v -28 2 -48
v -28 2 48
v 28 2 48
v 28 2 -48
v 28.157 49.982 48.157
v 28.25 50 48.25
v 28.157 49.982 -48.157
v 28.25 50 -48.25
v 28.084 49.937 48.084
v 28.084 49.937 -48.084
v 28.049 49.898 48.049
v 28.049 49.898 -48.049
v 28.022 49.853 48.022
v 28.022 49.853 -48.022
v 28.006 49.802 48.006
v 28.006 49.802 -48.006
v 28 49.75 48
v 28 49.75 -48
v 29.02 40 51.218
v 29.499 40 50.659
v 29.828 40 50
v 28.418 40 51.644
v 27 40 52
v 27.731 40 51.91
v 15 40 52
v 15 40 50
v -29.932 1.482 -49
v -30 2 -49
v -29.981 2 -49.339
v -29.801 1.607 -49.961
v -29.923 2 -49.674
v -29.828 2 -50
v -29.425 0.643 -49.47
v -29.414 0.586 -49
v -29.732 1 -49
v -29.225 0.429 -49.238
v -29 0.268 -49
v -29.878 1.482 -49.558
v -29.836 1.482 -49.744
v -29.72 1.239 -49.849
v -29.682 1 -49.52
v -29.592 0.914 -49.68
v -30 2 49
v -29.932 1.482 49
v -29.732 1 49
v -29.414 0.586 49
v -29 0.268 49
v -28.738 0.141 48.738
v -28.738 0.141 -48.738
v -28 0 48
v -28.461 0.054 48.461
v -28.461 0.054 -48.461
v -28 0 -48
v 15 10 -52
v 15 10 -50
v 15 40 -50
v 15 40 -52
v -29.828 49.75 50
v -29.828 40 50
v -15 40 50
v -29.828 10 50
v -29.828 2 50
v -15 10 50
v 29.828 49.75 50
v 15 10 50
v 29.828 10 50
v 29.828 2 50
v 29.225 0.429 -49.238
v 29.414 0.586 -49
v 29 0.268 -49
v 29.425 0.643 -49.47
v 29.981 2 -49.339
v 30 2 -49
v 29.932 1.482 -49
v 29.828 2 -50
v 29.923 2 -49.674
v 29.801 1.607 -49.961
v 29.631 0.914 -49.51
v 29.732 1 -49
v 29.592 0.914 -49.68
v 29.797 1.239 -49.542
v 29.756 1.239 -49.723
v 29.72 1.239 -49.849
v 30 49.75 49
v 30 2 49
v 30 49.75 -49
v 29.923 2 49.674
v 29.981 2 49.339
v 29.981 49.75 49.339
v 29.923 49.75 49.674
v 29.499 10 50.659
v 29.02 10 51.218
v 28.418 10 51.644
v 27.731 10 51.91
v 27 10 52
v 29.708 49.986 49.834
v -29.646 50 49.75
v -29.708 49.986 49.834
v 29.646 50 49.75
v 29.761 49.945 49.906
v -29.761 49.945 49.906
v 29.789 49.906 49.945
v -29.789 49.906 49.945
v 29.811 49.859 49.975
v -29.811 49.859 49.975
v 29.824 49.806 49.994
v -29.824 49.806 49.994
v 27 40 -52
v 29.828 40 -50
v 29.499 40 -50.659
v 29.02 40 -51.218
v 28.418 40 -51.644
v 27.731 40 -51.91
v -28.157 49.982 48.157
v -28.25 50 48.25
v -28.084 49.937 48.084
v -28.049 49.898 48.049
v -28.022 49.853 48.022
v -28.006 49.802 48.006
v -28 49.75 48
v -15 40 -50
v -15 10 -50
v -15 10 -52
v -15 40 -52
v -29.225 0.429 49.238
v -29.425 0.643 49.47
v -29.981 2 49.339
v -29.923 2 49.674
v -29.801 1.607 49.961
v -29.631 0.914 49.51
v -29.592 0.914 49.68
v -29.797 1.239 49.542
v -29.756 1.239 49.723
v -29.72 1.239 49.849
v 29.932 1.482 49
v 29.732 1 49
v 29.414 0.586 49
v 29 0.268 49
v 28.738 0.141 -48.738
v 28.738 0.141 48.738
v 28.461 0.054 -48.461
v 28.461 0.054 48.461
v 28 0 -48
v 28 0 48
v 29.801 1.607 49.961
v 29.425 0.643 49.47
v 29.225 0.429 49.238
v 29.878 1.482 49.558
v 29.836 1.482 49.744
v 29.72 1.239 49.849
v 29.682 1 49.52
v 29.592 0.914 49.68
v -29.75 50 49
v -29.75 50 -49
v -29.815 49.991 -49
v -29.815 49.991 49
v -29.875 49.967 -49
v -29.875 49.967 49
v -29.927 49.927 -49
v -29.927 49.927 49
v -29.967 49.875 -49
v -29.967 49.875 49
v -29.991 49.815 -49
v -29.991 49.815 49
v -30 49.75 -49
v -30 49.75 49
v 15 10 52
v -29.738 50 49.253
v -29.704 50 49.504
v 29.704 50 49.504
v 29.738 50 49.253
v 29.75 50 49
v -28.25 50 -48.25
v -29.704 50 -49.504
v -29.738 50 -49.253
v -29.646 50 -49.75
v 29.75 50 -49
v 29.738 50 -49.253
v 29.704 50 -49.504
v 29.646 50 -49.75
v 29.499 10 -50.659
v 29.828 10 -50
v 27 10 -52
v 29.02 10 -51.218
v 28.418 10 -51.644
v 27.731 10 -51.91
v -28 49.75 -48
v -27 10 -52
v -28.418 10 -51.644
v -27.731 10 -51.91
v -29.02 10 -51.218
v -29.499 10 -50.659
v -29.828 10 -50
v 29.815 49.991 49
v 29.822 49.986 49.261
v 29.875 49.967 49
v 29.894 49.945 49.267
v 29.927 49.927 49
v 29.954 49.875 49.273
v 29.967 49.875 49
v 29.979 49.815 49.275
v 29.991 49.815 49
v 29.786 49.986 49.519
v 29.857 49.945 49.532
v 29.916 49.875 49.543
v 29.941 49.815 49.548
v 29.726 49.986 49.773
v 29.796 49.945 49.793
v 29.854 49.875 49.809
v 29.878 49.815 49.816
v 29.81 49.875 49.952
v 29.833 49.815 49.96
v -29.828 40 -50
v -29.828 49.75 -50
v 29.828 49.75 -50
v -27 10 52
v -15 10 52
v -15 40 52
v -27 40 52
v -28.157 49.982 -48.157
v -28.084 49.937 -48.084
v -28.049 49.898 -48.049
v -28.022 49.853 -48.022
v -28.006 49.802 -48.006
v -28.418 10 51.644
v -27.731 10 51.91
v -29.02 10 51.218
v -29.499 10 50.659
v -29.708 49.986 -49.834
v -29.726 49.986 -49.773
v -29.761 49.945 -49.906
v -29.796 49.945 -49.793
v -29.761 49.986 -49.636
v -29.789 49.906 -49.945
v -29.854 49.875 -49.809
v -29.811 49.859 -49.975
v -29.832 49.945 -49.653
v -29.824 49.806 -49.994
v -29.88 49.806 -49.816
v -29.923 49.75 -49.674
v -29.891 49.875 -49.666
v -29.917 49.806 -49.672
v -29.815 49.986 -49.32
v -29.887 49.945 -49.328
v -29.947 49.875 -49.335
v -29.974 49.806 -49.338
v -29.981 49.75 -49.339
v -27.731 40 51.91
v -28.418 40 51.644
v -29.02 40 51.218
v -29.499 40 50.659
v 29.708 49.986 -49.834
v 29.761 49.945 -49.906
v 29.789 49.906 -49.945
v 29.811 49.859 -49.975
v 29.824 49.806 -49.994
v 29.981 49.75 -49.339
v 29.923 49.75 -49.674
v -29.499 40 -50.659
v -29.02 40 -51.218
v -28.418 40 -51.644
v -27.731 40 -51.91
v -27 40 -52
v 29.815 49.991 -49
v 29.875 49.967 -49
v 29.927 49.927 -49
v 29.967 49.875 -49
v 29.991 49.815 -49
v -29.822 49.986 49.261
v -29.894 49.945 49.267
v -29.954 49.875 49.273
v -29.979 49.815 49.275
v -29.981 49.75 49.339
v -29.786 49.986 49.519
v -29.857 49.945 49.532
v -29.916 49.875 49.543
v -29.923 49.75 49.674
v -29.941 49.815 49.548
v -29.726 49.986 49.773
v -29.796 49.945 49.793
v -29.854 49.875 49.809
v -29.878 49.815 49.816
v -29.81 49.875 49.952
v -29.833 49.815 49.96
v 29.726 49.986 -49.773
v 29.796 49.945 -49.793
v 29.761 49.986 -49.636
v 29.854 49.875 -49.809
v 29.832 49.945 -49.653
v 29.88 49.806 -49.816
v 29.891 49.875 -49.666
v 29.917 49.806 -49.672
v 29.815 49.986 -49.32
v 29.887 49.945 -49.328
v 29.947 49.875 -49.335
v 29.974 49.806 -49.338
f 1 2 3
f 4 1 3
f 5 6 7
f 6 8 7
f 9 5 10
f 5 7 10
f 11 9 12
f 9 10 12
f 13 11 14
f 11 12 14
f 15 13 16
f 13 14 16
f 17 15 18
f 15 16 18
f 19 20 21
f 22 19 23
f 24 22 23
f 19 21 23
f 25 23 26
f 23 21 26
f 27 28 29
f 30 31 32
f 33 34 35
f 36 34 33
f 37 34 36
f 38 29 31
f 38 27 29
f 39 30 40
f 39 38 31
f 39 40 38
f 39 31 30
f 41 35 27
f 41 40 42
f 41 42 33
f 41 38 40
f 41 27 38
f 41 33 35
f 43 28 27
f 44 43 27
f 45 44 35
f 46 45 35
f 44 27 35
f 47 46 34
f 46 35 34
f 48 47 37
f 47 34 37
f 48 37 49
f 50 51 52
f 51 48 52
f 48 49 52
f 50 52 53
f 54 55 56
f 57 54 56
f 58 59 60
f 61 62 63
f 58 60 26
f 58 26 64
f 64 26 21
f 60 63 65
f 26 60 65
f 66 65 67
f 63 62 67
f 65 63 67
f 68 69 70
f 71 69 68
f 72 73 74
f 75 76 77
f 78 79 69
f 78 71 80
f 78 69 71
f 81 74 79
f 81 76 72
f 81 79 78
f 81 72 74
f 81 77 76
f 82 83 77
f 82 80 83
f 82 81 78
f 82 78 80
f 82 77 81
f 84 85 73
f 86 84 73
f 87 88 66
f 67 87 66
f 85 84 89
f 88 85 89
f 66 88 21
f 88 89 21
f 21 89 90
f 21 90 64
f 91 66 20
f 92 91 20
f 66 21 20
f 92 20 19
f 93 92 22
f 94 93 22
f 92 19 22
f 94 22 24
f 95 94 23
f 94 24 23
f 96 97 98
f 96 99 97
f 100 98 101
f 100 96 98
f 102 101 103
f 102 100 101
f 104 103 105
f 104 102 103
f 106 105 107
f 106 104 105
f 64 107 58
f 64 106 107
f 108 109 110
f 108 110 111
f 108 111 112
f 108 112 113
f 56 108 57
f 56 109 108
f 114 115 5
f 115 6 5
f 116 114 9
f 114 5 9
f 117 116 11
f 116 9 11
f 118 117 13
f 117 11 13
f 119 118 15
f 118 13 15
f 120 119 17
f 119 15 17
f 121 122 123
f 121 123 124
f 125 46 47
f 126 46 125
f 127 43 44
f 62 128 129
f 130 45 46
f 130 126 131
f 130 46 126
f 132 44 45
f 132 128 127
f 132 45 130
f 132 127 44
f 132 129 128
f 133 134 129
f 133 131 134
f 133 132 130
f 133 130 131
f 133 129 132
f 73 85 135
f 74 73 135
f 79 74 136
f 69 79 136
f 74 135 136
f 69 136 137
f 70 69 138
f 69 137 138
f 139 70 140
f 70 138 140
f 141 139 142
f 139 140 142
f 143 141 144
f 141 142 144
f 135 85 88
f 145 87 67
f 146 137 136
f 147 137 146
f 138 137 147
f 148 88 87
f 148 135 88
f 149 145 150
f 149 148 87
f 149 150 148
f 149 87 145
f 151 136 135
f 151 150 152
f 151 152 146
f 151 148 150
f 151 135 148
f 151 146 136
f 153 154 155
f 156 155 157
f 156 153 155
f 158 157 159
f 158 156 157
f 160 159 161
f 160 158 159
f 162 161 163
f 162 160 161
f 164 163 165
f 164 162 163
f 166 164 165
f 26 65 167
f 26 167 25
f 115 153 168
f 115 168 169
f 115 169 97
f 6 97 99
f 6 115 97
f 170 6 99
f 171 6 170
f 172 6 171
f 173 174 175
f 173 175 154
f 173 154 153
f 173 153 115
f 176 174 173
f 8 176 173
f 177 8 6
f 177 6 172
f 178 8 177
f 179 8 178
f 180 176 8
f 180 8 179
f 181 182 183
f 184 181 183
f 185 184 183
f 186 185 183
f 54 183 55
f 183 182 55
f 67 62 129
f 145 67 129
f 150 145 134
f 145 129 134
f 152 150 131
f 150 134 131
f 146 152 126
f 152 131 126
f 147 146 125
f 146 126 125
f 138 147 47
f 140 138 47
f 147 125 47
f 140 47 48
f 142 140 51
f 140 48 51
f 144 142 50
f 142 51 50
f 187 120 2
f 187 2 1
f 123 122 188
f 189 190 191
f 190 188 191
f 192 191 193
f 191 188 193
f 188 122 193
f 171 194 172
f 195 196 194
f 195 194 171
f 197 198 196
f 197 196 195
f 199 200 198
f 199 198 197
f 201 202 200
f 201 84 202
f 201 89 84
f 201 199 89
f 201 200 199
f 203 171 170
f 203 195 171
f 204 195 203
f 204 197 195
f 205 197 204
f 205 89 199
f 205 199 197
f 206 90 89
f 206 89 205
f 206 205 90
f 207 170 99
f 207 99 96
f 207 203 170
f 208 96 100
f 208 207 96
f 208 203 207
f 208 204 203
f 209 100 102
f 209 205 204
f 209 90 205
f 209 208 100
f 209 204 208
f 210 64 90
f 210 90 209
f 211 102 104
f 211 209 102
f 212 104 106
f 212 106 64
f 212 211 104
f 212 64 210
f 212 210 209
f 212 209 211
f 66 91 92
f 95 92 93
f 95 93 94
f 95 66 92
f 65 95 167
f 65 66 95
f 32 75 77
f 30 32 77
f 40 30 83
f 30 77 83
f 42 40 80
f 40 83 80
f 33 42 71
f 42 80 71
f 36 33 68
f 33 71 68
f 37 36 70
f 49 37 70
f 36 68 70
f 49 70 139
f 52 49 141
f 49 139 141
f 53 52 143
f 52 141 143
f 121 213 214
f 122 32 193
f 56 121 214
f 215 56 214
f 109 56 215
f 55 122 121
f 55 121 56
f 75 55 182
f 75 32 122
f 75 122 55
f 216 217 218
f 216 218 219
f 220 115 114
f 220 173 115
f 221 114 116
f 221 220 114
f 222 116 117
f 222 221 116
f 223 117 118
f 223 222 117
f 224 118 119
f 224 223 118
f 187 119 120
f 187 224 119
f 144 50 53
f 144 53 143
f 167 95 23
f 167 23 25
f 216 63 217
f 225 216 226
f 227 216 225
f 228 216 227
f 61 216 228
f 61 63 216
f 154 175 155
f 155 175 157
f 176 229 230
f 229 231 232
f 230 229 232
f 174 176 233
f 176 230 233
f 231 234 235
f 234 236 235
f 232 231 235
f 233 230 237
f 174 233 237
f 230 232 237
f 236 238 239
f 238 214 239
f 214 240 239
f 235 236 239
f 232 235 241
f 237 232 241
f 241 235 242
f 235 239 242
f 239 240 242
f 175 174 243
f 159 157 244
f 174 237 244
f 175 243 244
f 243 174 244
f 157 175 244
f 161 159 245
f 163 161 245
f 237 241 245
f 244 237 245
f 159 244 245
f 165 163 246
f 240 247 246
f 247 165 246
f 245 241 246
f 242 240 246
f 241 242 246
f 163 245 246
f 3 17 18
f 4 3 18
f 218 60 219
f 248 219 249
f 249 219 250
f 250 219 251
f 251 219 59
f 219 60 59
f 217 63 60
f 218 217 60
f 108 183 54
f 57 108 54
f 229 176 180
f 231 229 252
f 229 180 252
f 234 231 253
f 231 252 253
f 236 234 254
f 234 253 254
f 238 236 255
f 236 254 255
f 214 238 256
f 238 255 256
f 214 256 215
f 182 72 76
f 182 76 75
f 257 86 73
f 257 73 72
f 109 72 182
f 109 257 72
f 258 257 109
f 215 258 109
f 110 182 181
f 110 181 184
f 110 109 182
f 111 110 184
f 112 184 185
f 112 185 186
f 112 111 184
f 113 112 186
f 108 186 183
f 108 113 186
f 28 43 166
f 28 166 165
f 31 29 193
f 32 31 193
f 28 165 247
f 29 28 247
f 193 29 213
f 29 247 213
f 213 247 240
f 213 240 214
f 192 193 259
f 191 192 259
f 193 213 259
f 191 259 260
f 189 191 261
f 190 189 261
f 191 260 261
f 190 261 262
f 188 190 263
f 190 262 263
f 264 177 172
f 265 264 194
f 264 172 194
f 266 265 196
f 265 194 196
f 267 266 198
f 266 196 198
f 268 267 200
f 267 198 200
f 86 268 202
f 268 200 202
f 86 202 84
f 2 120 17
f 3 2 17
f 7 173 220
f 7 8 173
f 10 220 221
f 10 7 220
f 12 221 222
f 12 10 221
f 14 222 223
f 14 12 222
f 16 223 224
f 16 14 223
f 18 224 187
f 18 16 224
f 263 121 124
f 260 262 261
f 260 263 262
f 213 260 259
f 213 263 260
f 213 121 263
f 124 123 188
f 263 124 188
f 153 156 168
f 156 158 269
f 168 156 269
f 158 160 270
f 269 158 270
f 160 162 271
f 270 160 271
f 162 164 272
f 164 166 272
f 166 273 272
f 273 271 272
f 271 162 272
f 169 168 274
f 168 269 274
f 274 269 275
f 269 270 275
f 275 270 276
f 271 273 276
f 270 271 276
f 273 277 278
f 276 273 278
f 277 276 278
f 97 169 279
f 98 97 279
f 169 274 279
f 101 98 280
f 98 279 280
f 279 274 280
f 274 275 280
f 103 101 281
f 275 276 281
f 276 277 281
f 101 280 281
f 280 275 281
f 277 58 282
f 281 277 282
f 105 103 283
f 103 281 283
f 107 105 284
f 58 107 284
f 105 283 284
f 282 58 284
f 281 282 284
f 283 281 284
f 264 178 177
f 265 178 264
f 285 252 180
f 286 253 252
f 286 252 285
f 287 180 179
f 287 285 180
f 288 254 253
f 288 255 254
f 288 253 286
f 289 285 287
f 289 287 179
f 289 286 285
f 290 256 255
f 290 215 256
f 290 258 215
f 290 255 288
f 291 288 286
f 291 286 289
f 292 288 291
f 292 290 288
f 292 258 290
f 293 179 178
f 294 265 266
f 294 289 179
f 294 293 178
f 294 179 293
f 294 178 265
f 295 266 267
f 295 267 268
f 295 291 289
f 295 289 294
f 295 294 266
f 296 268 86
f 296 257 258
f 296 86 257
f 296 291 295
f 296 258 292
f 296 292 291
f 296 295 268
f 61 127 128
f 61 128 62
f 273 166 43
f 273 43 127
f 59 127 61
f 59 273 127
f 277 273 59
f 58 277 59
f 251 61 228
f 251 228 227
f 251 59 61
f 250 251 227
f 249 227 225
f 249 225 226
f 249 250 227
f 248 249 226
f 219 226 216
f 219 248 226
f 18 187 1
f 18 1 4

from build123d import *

# Parameters (mm, degrees)
SKETCH2_W            = 60
SKETCH2_H            = 100
BOSS_EXTRUDE1_DEPTH  = 50
SKETCH3_W            = 56
SKETCH3_H            = 96
CUT_EXTRUDE1_DEPTH   = 48
SKETCH4_W            = 15
SKETCH4_H            = 30
BOSS_EXTRUDE2_DEPTH  = 2
FILLET1_R            = 3
FILLET1_OF_MIRROR1_R = 3
FILLET2_R            = 2
FILLET3_R            = 0.25


with BuildPart() as part:
    # Sketch2 → Boss-Extrude1 (new body)
    with BuildSketch(Plane(origin=(0, 0, 0), x_dir=(1, 0, 0), z_dir=(0, 1, 0))):
        Rectangle(SKETCH2_W, SKETCH2_H)
    extrude(amount=BOSS_EXTRUDE1_DEPTH)

    # Sketch3 → Cut-Extrude1 (cut)
    with BuildSketch(Plane(origin=(0, 50, 0), x_dir=(1, 0, 0), z_dir=(0, 1, 0))):
        Rectangle(SKETCH3_W, SKETCH3_H)
    extrude(amount=-CUT_EXTRUDE1_DEPTH, mode=Mode.SUBTRACT)

    # Sketch4 → Boss-Extrude2 (add)
    with BuildSketch(Plane(origin=(0, 0, -50), x_dir=(-1, 0, 0), z_dir=(0, 0, -1))):
        with Locations((-22.5, 25)):
            Rectangle(SKETCH4_W, SKETCH4_H)
        with Locations((22.5, 25)):
            Rectangle(SKETCH4_W, SKETCH4_H)
    boss_extrude2 = extrude(amount=BOSS_EXTRUDE2_DEPTH)

    # Fillet1
    fillet1_edges = [part.edges().sort_by_distance(p)[0] for p in [
        (30, 25, -52),
        (-30, 25, -52),
    ]]
    fillet(fillet1_edges, radius=FILLET1_R)

    # Mirror1: Boss-Extrude2 across plane
    add(boss_extrude2.mirror(Plane.XY))

    # Fillet1 of Mirror1
    fillet1_of_mirror1_edges = [part.edges().sort_by_distance(p)[0] for p in [
        (30, 25, 52),
        (-30, 25, 52),
    ]]
    fillet(fillet1_of_mirror1_edges, radius=FILLET1_OF_MIRROR1_R)

    # Fillet2
    # the kernel refuses this fillet: 2 mm, written as the material it takes off along each edge
    with BuildSketch(Plane(origin=(34.828427125, 0, -50), x_dir=(0, 0, 1), z_dir=(-1, 0, 0)), Plane(origin=(-34.828427125, 0, 50), x_dir=(0, 0, -1), z_dir=(1, 0, 0))) as fillet2_piece_1:
        with BuildLine():
            CenterArc((FILLET2_R, FILLET2_R), FILLET2_R, 180, 90)
            Line((0, FILLET2_R), (0, 0))
            Line((0, 0), (FILLET2_R, 0))
        make_face()
    extrude(amount=69.656854249, mode=Mode.SUBTRACT)
    with BuildSketch(Plane(origin=(-30, 0, -49), x_dir=(0, 1, 0), z_dir=(0, 0, 1))) as fillet2_piece_2:
        with BuildLine():
            CenterArc((FILLET2_R, -FILLET2_R), FILLET2_R, 90, 90)
            Line((0, -FILLET2_R), (0, 0))
            Line((0, 0), (FILLET2_R, 0))
        make_face()
    extrude(amount=98, mode=Mode.SUBTRACT)
    with BuildSketch(Plane(origin=(30, 0, 49), x_dir=(-1, 0, 0), z_dir=(0, 0, -1))) as fillet2_piece_3:
        with BuildLine():
            CenterArc((FILLET2_R, FILLET2_R), FILLET2_R, 180, 90)
            Line((0, FILLET2_R), (0, 0))
            Line((0, 0), (FILLET2_R, 0))
        make_face()
    extrude(amount=98, mode=Mode.SUBTRACT)
    with BuildSketch(Plane(origin=(27, 0, 49), x_dir=(1, 0, 0), z_dir=(0, 0, -1))) as fillet2_piece_4:
        with BuildLine():
            CenterArc((3 - FILLET2_R, -FILLET2_R), FILLET2_R, 0, 90)
            Line((3, -FILLET2_R), (3, 0))
            Line((3, 0), (3 - FILLET2_R, 0))
        make_face()
    revolve(axis=Axis((27, 0, 49), (0, -1, 0)), revolution_arc=114.9659815, mode=Mode.SUBTRACT)
    with BuildSketch(Plane(origin=(27, 0, -49), x_dir=(1, 0, 0), z_dir=(0, 0, 1))) as fillet2_piece_5:
        with BuildLine():
            CenterArc((3 - FILLET2_R, FILLET2_R), FILLET2_R, 270, 90)
            Line((3, FILLET2_R), (3, 0))
            Line((3, 0), (3 - FILLET2_R, 0))
        make_face()
    revolve(axis=Axis((27, 0, -49), (0, 1, 0)), revolution_arc=114.9659815, mode=Mode.SUBTRACT)
    with BuildSketch(Plane(origin=(-27, 0, -49), x_dir=(-1, 0, 0), z_dir=(0, 0, 1))) as fillet2_piece_6:
        with BuildLine():
            CenterArc((3 - FILLET2_R, -FILLET2_R), FILLET2_R, 0, 90)
            Line((3 - FILLET2_R, 0), (3, 0))
            Line((3, 0), (3, -FILLET2_R))
        make_face()
    revolve(axis=Axis((-27, 0, -49), (0, -1, 0)), revolution_arc=114.9659815, mode=Mode.SUBTRACT)
    with BuildSketch(Plane(origin=(-27, 0, 49), x_dir=(-1, 0, 0), z_dir=(0, 0, -1))) as fillet2_piece_7:
        with BuildLine():
            CenterArc((3 - FILLET2_R, FILLET2_R), FILLET2_R, 270, 90)
            Line((3 - FILLET2_R, 0), (3, 0))
            Line((3, 0), (3, FILLET2_R))
        make_face()
    revolve(axis=Axis((-27, 0, 49), (0, 1, 0)), revolution_arc=114.9659815, mode=Mode.SUBTRACT)

    # Fillet3
    fillet3_edges = [part.edges().sort_by_distance(p)[0] for p in [
        (0, 50, 50),
        (-29.956795679, 50, 49.507305936),
        (29.956795679, 50, 49.507305936),
        (28, 50, 0),
        (0, 50, -48),
        (-28, 50, 0),
        (0, 50, 48),
        (0, 50, -50),
        (-30, 50, 0),
        (-29.956795679, 50, -49.507305936),
        (29.956795679, 50, -49.507305936),
        (30, 50, 0),
    ]]
    fillet(fillet3_edges, radius=FILLET3_R)


solid = part.part
